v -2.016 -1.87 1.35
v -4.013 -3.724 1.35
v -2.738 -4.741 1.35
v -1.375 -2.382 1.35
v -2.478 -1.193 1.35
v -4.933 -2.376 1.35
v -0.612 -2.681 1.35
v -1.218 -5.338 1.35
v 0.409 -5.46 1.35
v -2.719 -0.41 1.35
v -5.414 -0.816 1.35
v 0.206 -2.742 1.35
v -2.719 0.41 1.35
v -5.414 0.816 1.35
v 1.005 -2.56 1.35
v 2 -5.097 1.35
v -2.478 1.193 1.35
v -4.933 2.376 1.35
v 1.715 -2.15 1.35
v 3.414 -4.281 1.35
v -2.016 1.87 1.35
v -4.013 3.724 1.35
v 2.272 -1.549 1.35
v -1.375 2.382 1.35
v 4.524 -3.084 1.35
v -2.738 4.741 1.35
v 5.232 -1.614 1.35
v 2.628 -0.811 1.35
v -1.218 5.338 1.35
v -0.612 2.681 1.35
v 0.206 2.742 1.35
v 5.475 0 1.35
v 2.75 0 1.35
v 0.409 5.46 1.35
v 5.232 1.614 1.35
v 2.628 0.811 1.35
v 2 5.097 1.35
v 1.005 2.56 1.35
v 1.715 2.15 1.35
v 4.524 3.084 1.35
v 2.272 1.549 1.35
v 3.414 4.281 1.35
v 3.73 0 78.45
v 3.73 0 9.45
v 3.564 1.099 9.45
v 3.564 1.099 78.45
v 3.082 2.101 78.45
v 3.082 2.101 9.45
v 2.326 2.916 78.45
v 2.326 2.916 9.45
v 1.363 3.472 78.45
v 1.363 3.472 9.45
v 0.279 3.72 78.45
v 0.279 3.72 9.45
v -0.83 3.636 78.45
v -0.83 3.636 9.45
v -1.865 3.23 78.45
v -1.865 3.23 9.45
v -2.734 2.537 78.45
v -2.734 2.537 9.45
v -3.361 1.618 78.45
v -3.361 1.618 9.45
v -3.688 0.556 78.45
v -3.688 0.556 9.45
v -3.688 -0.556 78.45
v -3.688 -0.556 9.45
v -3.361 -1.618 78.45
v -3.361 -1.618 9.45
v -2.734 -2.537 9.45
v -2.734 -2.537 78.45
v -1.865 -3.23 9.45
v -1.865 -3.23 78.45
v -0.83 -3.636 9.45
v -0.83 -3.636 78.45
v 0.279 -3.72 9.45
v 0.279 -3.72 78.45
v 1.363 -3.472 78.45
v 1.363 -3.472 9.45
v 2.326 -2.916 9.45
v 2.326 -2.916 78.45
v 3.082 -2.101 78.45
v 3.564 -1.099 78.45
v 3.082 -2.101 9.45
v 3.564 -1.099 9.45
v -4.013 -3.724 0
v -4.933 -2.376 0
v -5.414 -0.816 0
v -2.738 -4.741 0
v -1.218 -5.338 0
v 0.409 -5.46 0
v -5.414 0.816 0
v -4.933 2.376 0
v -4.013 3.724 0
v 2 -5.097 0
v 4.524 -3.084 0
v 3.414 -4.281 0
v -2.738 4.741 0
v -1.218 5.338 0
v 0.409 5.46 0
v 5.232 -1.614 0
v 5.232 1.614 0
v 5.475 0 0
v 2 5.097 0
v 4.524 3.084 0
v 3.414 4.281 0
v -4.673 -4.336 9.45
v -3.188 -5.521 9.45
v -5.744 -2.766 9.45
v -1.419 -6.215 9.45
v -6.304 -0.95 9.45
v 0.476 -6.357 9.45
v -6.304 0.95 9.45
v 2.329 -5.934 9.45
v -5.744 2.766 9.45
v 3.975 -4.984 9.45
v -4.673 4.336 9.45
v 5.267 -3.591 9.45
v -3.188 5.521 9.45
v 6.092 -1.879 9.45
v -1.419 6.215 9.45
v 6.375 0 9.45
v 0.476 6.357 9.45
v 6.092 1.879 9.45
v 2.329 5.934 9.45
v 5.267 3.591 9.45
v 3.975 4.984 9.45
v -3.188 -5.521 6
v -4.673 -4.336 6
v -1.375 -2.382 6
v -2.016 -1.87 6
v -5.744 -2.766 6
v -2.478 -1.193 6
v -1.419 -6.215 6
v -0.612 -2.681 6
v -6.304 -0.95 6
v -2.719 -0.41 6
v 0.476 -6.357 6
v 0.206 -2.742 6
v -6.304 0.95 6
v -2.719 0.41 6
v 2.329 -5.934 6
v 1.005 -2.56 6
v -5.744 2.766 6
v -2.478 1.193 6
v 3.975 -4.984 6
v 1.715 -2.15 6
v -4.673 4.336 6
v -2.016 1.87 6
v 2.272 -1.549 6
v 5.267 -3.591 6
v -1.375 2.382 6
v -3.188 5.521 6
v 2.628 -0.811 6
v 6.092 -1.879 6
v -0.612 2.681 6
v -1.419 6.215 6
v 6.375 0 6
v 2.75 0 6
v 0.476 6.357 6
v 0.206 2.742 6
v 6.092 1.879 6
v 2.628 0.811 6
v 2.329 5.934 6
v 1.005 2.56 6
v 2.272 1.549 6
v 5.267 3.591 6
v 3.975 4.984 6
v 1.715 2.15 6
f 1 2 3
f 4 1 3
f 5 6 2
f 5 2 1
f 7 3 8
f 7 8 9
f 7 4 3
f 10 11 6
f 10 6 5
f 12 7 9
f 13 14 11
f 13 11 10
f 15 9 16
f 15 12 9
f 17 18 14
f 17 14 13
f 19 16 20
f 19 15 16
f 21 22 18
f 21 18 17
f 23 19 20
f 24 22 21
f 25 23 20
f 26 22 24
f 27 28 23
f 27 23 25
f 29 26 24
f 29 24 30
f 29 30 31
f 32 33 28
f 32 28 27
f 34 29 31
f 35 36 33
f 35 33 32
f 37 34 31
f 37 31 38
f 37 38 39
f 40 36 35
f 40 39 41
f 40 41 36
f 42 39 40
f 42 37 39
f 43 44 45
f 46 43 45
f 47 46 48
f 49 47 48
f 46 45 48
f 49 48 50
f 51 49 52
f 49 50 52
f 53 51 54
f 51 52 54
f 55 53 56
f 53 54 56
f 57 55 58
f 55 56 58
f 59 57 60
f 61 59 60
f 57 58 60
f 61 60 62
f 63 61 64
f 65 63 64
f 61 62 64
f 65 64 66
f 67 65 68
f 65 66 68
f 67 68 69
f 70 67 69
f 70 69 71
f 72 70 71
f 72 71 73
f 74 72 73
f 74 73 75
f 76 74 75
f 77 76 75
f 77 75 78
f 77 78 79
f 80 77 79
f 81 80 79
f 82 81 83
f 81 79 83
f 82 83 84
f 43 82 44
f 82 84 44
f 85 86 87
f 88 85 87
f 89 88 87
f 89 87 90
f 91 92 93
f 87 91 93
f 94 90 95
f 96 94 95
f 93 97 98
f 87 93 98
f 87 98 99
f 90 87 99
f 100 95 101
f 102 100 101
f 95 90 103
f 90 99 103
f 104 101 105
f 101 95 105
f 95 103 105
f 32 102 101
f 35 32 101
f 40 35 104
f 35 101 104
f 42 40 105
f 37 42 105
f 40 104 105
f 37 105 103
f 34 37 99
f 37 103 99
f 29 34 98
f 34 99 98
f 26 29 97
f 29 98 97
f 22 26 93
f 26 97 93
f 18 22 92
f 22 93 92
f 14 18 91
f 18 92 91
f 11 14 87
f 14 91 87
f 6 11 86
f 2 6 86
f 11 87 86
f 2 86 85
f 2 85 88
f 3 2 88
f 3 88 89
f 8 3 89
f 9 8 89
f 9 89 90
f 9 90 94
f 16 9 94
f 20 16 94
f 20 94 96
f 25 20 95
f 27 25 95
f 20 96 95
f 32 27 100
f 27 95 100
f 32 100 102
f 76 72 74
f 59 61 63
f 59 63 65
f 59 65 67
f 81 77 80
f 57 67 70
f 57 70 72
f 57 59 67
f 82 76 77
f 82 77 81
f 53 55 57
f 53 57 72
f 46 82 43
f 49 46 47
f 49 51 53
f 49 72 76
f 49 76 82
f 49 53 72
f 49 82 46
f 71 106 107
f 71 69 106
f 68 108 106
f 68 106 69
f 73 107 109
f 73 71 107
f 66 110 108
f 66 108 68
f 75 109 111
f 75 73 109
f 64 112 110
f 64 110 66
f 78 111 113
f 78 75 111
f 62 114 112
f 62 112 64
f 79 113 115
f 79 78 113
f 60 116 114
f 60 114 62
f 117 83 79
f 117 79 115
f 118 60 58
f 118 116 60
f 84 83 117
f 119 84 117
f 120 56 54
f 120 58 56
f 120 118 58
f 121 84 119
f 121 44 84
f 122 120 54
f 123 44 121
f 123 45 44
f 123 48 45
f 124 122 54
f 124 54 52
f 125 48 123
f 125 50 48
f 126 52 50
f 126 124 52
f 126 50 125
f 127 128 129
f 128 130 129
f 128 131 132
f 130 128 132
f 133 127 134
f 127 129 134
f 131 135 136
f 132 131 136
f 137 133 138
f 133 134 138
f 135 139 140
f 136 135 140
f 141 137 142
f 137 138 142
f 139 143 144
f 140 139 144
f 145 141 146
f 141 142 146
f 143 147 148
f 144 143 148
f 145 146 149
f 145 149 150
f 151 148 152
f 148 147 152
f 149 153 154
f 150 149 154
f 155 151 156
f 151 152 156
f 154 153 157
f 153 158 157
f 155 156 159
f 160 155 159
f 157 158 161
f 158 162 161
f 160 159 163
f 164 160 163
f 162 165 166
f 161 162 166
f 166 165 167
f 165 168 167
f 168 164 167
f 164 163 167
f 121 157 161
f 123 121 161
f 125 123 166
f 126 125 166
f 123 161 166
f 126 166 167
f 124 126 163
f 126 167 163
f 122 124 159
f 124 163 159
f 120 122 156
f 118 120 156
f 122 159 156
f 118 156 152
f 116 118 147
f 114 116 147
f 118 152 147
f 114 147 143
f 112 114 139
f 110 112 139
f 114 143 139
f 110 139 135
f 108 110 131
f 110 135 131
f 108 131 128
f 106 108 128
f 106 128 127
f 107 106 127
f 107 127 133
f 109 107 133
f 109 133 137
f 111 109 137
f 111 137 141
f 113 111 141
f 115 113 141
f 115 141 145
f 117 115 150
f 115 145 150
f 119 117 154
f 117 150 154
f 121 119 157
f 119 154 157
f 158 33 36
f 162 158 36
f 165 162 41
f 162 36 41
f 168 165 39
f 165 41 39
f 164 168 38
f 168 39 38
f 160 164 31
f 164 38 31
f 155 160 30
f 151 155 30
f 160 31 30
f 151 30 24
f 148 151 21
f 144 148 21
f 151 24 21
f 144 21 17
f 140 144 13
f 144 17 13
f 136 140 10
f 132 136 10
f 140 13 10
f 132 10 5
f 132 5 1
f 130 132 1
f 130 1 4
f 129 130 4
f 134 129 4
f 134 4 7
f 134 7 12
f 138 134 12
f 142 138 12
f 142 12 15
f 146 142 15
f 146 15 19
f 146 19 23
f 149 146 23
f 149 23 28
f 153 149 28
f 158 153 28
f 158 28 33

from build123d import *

# Parameters (mm, degrees)
F0_R     = 5.475
F1_DEPTH = 1.35
F2_R     = 2.75
F3_DEPTH = 6
F4_R     = 6.375
F5_DEPTH = 3.45
F6_R     = 3.73
F7_DEPTH = 69


with BuildPart() as f1:
    # F0 (on Top) → F1 (new body)
    with BuildSketch(Plane.XY):
        Circle(F0_R)
    extrude(amount=F1_DEPTH)

    # F2 (on Top) → F3 (join)
    with BuildSketch(Plane.XY):
        Circle(F2_R)
    extrude(amount=F3_DEPTH)

    # F4 (on face) → F5 (join)
    with BuildSketch(Plane.XY.offset(6)):
        Circle(F4_R)
    extrude(amount=F5_DEPTH)

    # F6 (on face) → F7 (join)
    with BuildSketch(Plane.XY.offset(9.45)):
        Circle(F6_R)
    extrude(amount=F7_DEPTH)


solid = f1.part
